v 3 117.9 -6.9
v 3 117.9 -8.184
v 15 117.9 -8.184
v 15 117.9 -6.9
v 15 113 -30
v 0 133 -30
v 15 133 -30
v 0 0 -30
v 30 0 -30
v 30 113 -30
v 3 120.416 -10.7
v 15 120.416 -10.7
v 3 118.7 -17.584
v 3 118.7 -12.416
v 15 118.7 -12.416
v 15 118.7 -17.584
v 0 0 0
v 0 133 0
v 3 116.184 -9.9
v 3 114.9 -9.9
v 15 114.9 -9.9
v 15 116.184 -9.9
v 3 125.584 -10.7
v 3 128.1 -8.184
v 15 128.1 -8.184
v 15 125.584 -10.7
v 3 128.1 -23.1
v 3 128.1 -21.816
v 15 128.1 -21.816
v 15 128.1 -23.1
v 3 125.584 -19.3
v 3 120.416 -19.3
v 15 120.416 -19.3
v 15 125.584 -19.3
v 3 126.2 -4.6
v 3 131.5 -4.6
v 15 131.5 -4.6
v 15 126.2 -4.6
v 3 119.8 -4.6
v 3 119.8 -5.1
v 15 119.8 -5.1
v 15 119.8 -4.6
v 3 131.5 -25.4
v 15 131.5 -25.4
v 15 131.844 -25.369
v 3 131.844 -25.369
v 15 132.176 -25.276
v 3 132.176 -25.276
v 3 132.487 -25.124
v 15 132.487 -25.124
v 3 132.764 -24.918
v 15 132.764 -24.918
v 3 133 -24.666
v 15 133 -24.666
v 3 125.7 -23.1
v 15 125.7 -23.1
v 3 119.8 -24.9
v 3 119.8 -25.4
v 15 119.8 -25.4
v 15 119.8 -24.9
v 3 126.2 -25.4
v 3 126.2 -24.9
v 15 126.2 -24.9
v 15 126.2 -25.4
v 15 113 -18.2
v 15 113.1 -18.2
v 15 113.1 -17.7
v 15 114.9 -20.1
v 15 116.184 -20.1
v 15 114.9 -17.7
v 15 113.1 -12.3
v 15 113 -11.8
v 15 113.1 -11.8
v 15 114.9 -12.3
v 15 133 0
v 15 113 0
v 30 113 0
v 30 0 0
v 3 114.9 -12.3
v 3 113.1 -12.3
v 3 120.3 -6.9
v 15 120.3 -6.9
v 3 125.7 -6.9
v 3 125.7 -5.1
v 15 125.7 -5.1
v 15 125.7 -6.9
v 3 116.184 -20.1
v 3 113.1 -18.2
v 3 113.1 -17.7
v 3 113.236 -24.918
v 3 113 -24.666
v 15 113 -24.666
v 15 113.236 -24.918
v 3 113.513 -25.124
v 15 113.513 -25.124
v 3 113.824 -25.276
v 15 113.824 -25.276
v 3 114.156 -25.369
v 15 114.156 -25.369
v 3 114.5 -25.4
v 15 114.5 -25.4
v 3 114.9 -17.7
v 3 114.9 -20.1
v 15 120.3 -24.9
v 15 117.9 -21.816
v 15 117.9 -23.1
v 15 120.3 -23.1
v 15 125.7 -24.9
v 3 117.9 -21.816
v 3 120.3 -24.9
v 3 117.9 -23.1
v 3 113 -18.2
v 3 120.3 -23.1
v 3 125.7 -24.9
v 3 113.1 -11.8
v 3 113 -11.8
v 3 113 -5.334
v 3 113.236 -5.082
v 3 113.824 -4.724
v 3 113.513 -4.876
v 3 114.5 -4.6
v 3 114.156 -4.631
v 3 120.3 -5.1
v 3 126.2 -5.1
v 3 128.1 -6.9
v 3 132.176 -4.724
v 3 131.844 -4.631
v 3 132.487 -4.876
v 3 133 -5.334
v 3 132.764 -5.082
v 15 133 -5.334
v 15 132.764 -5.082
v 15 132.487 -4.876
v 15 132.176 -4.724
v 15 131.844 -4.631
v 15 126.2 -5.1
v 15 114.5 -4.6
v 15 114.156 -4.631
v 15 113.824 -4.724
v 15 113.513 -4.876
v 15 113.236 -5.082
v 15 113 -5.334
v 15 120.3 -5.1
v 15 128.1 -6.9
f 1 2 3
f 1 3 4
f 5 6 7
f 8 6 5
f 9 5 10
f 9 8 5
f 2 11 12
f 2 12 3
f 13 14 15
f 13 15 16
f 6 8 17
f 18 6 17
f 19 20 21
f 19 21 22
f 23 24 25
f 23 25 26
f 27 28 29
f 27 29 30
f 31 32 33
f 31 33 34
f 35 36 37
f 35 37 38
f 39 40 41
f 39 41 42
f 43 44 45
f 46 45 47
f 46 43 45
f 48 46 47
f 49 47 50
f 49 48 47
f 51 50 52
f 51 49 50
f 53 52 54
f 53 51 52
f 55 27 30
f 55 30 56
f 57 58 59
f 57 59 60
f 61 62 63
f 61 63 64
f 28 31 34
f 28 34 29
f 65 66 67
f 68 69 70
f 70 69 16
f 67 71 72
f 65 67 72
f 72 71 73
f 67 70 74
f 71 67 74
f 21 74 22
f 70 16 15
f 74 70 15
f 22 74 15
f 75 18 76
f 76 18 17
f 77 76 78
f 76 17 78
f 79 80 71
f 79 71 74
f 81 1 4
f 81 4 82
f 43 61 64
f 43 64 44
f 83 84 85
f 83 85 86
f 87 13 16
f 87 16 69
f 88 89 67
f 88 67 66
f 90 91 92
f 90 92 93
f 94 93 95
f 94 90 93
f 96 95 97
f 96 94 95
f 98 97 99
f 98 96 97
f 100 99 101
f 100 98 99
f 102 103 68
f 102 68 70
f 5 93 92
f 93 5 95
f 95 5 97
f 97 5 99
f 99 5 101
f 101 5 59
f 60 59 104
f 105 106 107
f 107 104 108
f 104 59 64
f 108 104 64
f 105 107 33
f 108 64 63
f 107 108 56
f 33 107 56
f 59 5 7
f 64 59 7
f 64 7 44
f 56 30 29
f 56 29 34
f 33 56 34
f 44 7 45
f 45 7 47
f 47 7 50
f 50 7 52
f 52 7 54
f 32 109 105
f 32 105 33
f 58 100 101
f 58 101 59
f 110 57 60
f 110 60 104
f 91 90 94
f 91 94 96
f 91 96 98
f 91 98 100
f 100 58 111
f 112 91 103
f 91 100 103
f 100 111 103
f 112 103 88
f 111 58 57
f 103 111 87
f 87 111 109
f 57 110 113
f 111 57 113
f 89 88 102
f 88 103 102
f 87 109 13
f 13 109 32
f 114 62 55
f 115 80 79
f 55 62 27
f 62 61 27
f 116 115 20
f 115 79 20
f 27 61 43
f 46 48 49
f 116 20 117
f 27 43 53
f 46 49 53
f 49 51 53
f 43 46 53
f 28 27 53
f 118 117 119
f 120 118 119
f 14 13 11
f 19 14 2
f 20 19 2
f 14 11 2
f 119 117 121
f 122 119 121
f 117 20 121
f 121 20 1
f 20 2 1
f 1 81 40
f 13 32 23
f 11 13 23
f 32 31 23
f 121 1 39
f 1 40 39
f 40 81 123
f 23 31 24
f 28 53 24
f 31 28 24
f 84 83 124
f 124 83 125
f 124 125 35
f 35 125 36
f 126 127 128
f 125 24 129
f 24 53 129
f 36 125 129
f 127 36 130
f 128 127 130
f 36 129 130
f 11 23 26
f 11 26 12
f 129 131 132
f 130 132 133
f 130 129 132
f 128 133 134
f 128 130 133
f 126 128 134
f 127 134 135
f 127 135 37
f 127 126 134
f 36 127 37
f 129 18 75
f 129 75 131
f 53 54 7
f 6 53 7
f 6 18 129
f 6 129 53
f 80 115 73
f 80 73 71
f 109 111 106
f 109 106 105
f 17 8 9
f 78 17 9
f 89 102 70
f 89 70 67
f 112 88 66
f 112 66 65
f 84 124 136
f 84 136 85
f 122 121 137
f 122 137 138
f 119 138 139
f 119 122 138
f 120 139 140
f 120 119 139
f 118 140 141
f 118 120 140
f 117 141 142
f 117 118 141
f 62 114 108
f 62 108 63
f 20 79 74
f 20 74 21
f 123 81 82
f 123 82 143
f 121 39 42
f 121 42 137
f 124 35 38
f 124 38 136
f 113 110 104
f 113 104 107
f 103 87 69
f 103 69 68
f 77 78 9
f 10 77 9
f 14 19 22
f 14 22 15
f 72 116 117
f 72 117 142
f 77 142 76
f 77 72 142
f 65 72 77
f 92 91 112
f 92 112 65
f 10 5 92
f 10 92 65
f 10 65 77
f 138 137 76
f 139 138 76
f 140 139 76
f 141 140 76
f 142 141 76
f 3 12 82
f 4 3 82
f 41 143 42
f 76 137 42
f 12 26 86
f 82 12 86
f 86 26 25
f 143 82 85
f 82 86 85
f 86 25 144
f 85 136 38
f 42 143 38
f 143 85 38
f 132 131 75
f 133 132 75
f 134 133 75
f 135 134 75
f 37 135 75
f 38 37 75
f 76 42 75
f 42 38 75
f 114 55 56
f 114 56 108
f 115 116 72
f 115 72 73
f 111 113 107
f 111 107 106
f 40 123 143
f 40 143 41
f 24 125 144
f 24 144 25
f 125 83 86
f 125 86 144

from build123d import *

# Parameters (mm, degrees)
SKETCH_2_W      = 30
SKETCH_2_H      = 30
EXTRUDE_1_DEPTH = 113
EXTRUDE_2_DEPTH = 15
SKETCH_4_W      = 30
SKETCH_4_H      = 20
EXTRUDE_4_DEPTH = 3


with BuildPart() as part:
    # 草图2 → 凸台-拉伸1 (new body)
    with BuildSketch(Plane(origin=(0, 0, 0), x_dir=(1, 0, 0), z_dir=(0, 1, 0))):
        with Locations((15, 15)):
            Rectangle(SKETCH_2_W, SKETCH_2_H)
    extrude(amount=EXTRUDE_1_DEPTH)

    # 草图3 → 凸台-拉伸2 (add)
    with BuildSketch(Plane.ZY):
        with BuildLine():
            Line((-30, 113), (-24.666190379, 113))
            ThreePointArc((-24.666190379, 113), (-25.206716397, 113.665063392), (-25.4, 114.5))
            Line((-25.4, 114.5), (-25.4, 119.8))
            Line((-25.4, 119.8), (-24.9, 119.8))
            Line((-24.9, 119.8), (-24.9, 120.3))
            Line((-24.9, 120.3), (-23.1, 120.3))
            Line((-23.1, 120.3), (-23.1, 117.9))
            Line((-23.1, 117.9), (-21.815685425, 117.9))
            Line((-21.815685425, 117.9), (-19.3, 120.415685425))
            Line((-19.3, 120.415685425), (-19.3, 125.584314575))
            Line((-19.3, 125.584314575), (-21.815685425, 128.1))
            Line((-21.815685425, 128.1), (-23.1, 128.1))
            Line((-23.1, 128.1), (-23.1, 125.7))
            Line((-23.1, 125.7), (-24.9, 125.7))
            Line((-24.9, 125.7), (-24.9, 126.2))
            Line((-24.9, 126.2), (-25.4, 126.2))
            Line((-25.4, 126.2), (-25.4, 131.5))
            ThreePointArc((-25.4, 131.5), (-25.206716397, 132.334936608), (-24.666190379, 133))
            Line((-24.666190379, 133), (-30, 133))
            Line((-30, 133), (-30, 113))
        make_face()
        Polygon((-18.2, 113.1), (-18.2, 113), (-11.8, 113), (-11.8, 113.1), (-12.3, 113.1), (-12.3, 114.9), (-9.9, 114.9), (-9.9, 116.184314575), (-12.415685425, 118.7), (-17.584314575, 118.7), (-20.1, 116.184314575), (-20.1, 114.9), (-17.7, 114.9), (-17.7, 113.1), align=None)
        with BuildLine():
            ThreePointArc((-4.6, 114.5), (-4.793283603, 113.665063392), (-5.333809621, 113))
            Line((-5.333809621, 113), (0, 113))
            Line((0, 113), (0, 133))
            Line((0, 133), (-5.333809621, 133))
            ThreePointArc((-5.333809621, 133), (-4.793283603, 132.334936608), (-4.6, 131.5))
            Line((-4.6, 131.5), (-4.6, 126.2))
            Line((-4.6, 126.2), (-5.1, 126.2))
            Line((-5.1, 126.2), (-5.1, 125.7))
            Line((-5.1, 125.7), (-6.9, 125.7))
            Line((-6.9, 125.7), (-6.9, 128.1))
            Line((-6.9, 128.1), (-8.184314575, 128.1))
            Line((-8.184314575, 128.1), (-10.7, 125.584314575))
            Line((-10.7, 125.584314575), (-10.7, 120.415685425))
            Line((-10.7, 120.415685425), (-8.184314575, 117.9))
            Line((-8.184314575, 117.9), (-6.9, 117.9))
            Line((-6.9, 117.9), (-6.9, 120.3))
            Line((-6.9, 120.3), (-5.1, 120.3))
            Line((-5.1, 120.3), (-5.1, 119.8))
            Line((-5.1, 119.8), (-4.6, 119.8))
            Line((-4.6, 119.8), (-4.6, 114.5))
        make_face()
    extrude(amount=-EXTRUDE_2_DEPTH)

    # 草图4 → 凸台-拉伸4 (add)
    with BuildSketch(Plane.ZY):
        with Locations((-15, 123)):
            Rectangle(SKETCH_4_W, SKETCH_4_H)
    extrude(amount=-EXTRUDE_4_DEPTH)


solid = part.part
